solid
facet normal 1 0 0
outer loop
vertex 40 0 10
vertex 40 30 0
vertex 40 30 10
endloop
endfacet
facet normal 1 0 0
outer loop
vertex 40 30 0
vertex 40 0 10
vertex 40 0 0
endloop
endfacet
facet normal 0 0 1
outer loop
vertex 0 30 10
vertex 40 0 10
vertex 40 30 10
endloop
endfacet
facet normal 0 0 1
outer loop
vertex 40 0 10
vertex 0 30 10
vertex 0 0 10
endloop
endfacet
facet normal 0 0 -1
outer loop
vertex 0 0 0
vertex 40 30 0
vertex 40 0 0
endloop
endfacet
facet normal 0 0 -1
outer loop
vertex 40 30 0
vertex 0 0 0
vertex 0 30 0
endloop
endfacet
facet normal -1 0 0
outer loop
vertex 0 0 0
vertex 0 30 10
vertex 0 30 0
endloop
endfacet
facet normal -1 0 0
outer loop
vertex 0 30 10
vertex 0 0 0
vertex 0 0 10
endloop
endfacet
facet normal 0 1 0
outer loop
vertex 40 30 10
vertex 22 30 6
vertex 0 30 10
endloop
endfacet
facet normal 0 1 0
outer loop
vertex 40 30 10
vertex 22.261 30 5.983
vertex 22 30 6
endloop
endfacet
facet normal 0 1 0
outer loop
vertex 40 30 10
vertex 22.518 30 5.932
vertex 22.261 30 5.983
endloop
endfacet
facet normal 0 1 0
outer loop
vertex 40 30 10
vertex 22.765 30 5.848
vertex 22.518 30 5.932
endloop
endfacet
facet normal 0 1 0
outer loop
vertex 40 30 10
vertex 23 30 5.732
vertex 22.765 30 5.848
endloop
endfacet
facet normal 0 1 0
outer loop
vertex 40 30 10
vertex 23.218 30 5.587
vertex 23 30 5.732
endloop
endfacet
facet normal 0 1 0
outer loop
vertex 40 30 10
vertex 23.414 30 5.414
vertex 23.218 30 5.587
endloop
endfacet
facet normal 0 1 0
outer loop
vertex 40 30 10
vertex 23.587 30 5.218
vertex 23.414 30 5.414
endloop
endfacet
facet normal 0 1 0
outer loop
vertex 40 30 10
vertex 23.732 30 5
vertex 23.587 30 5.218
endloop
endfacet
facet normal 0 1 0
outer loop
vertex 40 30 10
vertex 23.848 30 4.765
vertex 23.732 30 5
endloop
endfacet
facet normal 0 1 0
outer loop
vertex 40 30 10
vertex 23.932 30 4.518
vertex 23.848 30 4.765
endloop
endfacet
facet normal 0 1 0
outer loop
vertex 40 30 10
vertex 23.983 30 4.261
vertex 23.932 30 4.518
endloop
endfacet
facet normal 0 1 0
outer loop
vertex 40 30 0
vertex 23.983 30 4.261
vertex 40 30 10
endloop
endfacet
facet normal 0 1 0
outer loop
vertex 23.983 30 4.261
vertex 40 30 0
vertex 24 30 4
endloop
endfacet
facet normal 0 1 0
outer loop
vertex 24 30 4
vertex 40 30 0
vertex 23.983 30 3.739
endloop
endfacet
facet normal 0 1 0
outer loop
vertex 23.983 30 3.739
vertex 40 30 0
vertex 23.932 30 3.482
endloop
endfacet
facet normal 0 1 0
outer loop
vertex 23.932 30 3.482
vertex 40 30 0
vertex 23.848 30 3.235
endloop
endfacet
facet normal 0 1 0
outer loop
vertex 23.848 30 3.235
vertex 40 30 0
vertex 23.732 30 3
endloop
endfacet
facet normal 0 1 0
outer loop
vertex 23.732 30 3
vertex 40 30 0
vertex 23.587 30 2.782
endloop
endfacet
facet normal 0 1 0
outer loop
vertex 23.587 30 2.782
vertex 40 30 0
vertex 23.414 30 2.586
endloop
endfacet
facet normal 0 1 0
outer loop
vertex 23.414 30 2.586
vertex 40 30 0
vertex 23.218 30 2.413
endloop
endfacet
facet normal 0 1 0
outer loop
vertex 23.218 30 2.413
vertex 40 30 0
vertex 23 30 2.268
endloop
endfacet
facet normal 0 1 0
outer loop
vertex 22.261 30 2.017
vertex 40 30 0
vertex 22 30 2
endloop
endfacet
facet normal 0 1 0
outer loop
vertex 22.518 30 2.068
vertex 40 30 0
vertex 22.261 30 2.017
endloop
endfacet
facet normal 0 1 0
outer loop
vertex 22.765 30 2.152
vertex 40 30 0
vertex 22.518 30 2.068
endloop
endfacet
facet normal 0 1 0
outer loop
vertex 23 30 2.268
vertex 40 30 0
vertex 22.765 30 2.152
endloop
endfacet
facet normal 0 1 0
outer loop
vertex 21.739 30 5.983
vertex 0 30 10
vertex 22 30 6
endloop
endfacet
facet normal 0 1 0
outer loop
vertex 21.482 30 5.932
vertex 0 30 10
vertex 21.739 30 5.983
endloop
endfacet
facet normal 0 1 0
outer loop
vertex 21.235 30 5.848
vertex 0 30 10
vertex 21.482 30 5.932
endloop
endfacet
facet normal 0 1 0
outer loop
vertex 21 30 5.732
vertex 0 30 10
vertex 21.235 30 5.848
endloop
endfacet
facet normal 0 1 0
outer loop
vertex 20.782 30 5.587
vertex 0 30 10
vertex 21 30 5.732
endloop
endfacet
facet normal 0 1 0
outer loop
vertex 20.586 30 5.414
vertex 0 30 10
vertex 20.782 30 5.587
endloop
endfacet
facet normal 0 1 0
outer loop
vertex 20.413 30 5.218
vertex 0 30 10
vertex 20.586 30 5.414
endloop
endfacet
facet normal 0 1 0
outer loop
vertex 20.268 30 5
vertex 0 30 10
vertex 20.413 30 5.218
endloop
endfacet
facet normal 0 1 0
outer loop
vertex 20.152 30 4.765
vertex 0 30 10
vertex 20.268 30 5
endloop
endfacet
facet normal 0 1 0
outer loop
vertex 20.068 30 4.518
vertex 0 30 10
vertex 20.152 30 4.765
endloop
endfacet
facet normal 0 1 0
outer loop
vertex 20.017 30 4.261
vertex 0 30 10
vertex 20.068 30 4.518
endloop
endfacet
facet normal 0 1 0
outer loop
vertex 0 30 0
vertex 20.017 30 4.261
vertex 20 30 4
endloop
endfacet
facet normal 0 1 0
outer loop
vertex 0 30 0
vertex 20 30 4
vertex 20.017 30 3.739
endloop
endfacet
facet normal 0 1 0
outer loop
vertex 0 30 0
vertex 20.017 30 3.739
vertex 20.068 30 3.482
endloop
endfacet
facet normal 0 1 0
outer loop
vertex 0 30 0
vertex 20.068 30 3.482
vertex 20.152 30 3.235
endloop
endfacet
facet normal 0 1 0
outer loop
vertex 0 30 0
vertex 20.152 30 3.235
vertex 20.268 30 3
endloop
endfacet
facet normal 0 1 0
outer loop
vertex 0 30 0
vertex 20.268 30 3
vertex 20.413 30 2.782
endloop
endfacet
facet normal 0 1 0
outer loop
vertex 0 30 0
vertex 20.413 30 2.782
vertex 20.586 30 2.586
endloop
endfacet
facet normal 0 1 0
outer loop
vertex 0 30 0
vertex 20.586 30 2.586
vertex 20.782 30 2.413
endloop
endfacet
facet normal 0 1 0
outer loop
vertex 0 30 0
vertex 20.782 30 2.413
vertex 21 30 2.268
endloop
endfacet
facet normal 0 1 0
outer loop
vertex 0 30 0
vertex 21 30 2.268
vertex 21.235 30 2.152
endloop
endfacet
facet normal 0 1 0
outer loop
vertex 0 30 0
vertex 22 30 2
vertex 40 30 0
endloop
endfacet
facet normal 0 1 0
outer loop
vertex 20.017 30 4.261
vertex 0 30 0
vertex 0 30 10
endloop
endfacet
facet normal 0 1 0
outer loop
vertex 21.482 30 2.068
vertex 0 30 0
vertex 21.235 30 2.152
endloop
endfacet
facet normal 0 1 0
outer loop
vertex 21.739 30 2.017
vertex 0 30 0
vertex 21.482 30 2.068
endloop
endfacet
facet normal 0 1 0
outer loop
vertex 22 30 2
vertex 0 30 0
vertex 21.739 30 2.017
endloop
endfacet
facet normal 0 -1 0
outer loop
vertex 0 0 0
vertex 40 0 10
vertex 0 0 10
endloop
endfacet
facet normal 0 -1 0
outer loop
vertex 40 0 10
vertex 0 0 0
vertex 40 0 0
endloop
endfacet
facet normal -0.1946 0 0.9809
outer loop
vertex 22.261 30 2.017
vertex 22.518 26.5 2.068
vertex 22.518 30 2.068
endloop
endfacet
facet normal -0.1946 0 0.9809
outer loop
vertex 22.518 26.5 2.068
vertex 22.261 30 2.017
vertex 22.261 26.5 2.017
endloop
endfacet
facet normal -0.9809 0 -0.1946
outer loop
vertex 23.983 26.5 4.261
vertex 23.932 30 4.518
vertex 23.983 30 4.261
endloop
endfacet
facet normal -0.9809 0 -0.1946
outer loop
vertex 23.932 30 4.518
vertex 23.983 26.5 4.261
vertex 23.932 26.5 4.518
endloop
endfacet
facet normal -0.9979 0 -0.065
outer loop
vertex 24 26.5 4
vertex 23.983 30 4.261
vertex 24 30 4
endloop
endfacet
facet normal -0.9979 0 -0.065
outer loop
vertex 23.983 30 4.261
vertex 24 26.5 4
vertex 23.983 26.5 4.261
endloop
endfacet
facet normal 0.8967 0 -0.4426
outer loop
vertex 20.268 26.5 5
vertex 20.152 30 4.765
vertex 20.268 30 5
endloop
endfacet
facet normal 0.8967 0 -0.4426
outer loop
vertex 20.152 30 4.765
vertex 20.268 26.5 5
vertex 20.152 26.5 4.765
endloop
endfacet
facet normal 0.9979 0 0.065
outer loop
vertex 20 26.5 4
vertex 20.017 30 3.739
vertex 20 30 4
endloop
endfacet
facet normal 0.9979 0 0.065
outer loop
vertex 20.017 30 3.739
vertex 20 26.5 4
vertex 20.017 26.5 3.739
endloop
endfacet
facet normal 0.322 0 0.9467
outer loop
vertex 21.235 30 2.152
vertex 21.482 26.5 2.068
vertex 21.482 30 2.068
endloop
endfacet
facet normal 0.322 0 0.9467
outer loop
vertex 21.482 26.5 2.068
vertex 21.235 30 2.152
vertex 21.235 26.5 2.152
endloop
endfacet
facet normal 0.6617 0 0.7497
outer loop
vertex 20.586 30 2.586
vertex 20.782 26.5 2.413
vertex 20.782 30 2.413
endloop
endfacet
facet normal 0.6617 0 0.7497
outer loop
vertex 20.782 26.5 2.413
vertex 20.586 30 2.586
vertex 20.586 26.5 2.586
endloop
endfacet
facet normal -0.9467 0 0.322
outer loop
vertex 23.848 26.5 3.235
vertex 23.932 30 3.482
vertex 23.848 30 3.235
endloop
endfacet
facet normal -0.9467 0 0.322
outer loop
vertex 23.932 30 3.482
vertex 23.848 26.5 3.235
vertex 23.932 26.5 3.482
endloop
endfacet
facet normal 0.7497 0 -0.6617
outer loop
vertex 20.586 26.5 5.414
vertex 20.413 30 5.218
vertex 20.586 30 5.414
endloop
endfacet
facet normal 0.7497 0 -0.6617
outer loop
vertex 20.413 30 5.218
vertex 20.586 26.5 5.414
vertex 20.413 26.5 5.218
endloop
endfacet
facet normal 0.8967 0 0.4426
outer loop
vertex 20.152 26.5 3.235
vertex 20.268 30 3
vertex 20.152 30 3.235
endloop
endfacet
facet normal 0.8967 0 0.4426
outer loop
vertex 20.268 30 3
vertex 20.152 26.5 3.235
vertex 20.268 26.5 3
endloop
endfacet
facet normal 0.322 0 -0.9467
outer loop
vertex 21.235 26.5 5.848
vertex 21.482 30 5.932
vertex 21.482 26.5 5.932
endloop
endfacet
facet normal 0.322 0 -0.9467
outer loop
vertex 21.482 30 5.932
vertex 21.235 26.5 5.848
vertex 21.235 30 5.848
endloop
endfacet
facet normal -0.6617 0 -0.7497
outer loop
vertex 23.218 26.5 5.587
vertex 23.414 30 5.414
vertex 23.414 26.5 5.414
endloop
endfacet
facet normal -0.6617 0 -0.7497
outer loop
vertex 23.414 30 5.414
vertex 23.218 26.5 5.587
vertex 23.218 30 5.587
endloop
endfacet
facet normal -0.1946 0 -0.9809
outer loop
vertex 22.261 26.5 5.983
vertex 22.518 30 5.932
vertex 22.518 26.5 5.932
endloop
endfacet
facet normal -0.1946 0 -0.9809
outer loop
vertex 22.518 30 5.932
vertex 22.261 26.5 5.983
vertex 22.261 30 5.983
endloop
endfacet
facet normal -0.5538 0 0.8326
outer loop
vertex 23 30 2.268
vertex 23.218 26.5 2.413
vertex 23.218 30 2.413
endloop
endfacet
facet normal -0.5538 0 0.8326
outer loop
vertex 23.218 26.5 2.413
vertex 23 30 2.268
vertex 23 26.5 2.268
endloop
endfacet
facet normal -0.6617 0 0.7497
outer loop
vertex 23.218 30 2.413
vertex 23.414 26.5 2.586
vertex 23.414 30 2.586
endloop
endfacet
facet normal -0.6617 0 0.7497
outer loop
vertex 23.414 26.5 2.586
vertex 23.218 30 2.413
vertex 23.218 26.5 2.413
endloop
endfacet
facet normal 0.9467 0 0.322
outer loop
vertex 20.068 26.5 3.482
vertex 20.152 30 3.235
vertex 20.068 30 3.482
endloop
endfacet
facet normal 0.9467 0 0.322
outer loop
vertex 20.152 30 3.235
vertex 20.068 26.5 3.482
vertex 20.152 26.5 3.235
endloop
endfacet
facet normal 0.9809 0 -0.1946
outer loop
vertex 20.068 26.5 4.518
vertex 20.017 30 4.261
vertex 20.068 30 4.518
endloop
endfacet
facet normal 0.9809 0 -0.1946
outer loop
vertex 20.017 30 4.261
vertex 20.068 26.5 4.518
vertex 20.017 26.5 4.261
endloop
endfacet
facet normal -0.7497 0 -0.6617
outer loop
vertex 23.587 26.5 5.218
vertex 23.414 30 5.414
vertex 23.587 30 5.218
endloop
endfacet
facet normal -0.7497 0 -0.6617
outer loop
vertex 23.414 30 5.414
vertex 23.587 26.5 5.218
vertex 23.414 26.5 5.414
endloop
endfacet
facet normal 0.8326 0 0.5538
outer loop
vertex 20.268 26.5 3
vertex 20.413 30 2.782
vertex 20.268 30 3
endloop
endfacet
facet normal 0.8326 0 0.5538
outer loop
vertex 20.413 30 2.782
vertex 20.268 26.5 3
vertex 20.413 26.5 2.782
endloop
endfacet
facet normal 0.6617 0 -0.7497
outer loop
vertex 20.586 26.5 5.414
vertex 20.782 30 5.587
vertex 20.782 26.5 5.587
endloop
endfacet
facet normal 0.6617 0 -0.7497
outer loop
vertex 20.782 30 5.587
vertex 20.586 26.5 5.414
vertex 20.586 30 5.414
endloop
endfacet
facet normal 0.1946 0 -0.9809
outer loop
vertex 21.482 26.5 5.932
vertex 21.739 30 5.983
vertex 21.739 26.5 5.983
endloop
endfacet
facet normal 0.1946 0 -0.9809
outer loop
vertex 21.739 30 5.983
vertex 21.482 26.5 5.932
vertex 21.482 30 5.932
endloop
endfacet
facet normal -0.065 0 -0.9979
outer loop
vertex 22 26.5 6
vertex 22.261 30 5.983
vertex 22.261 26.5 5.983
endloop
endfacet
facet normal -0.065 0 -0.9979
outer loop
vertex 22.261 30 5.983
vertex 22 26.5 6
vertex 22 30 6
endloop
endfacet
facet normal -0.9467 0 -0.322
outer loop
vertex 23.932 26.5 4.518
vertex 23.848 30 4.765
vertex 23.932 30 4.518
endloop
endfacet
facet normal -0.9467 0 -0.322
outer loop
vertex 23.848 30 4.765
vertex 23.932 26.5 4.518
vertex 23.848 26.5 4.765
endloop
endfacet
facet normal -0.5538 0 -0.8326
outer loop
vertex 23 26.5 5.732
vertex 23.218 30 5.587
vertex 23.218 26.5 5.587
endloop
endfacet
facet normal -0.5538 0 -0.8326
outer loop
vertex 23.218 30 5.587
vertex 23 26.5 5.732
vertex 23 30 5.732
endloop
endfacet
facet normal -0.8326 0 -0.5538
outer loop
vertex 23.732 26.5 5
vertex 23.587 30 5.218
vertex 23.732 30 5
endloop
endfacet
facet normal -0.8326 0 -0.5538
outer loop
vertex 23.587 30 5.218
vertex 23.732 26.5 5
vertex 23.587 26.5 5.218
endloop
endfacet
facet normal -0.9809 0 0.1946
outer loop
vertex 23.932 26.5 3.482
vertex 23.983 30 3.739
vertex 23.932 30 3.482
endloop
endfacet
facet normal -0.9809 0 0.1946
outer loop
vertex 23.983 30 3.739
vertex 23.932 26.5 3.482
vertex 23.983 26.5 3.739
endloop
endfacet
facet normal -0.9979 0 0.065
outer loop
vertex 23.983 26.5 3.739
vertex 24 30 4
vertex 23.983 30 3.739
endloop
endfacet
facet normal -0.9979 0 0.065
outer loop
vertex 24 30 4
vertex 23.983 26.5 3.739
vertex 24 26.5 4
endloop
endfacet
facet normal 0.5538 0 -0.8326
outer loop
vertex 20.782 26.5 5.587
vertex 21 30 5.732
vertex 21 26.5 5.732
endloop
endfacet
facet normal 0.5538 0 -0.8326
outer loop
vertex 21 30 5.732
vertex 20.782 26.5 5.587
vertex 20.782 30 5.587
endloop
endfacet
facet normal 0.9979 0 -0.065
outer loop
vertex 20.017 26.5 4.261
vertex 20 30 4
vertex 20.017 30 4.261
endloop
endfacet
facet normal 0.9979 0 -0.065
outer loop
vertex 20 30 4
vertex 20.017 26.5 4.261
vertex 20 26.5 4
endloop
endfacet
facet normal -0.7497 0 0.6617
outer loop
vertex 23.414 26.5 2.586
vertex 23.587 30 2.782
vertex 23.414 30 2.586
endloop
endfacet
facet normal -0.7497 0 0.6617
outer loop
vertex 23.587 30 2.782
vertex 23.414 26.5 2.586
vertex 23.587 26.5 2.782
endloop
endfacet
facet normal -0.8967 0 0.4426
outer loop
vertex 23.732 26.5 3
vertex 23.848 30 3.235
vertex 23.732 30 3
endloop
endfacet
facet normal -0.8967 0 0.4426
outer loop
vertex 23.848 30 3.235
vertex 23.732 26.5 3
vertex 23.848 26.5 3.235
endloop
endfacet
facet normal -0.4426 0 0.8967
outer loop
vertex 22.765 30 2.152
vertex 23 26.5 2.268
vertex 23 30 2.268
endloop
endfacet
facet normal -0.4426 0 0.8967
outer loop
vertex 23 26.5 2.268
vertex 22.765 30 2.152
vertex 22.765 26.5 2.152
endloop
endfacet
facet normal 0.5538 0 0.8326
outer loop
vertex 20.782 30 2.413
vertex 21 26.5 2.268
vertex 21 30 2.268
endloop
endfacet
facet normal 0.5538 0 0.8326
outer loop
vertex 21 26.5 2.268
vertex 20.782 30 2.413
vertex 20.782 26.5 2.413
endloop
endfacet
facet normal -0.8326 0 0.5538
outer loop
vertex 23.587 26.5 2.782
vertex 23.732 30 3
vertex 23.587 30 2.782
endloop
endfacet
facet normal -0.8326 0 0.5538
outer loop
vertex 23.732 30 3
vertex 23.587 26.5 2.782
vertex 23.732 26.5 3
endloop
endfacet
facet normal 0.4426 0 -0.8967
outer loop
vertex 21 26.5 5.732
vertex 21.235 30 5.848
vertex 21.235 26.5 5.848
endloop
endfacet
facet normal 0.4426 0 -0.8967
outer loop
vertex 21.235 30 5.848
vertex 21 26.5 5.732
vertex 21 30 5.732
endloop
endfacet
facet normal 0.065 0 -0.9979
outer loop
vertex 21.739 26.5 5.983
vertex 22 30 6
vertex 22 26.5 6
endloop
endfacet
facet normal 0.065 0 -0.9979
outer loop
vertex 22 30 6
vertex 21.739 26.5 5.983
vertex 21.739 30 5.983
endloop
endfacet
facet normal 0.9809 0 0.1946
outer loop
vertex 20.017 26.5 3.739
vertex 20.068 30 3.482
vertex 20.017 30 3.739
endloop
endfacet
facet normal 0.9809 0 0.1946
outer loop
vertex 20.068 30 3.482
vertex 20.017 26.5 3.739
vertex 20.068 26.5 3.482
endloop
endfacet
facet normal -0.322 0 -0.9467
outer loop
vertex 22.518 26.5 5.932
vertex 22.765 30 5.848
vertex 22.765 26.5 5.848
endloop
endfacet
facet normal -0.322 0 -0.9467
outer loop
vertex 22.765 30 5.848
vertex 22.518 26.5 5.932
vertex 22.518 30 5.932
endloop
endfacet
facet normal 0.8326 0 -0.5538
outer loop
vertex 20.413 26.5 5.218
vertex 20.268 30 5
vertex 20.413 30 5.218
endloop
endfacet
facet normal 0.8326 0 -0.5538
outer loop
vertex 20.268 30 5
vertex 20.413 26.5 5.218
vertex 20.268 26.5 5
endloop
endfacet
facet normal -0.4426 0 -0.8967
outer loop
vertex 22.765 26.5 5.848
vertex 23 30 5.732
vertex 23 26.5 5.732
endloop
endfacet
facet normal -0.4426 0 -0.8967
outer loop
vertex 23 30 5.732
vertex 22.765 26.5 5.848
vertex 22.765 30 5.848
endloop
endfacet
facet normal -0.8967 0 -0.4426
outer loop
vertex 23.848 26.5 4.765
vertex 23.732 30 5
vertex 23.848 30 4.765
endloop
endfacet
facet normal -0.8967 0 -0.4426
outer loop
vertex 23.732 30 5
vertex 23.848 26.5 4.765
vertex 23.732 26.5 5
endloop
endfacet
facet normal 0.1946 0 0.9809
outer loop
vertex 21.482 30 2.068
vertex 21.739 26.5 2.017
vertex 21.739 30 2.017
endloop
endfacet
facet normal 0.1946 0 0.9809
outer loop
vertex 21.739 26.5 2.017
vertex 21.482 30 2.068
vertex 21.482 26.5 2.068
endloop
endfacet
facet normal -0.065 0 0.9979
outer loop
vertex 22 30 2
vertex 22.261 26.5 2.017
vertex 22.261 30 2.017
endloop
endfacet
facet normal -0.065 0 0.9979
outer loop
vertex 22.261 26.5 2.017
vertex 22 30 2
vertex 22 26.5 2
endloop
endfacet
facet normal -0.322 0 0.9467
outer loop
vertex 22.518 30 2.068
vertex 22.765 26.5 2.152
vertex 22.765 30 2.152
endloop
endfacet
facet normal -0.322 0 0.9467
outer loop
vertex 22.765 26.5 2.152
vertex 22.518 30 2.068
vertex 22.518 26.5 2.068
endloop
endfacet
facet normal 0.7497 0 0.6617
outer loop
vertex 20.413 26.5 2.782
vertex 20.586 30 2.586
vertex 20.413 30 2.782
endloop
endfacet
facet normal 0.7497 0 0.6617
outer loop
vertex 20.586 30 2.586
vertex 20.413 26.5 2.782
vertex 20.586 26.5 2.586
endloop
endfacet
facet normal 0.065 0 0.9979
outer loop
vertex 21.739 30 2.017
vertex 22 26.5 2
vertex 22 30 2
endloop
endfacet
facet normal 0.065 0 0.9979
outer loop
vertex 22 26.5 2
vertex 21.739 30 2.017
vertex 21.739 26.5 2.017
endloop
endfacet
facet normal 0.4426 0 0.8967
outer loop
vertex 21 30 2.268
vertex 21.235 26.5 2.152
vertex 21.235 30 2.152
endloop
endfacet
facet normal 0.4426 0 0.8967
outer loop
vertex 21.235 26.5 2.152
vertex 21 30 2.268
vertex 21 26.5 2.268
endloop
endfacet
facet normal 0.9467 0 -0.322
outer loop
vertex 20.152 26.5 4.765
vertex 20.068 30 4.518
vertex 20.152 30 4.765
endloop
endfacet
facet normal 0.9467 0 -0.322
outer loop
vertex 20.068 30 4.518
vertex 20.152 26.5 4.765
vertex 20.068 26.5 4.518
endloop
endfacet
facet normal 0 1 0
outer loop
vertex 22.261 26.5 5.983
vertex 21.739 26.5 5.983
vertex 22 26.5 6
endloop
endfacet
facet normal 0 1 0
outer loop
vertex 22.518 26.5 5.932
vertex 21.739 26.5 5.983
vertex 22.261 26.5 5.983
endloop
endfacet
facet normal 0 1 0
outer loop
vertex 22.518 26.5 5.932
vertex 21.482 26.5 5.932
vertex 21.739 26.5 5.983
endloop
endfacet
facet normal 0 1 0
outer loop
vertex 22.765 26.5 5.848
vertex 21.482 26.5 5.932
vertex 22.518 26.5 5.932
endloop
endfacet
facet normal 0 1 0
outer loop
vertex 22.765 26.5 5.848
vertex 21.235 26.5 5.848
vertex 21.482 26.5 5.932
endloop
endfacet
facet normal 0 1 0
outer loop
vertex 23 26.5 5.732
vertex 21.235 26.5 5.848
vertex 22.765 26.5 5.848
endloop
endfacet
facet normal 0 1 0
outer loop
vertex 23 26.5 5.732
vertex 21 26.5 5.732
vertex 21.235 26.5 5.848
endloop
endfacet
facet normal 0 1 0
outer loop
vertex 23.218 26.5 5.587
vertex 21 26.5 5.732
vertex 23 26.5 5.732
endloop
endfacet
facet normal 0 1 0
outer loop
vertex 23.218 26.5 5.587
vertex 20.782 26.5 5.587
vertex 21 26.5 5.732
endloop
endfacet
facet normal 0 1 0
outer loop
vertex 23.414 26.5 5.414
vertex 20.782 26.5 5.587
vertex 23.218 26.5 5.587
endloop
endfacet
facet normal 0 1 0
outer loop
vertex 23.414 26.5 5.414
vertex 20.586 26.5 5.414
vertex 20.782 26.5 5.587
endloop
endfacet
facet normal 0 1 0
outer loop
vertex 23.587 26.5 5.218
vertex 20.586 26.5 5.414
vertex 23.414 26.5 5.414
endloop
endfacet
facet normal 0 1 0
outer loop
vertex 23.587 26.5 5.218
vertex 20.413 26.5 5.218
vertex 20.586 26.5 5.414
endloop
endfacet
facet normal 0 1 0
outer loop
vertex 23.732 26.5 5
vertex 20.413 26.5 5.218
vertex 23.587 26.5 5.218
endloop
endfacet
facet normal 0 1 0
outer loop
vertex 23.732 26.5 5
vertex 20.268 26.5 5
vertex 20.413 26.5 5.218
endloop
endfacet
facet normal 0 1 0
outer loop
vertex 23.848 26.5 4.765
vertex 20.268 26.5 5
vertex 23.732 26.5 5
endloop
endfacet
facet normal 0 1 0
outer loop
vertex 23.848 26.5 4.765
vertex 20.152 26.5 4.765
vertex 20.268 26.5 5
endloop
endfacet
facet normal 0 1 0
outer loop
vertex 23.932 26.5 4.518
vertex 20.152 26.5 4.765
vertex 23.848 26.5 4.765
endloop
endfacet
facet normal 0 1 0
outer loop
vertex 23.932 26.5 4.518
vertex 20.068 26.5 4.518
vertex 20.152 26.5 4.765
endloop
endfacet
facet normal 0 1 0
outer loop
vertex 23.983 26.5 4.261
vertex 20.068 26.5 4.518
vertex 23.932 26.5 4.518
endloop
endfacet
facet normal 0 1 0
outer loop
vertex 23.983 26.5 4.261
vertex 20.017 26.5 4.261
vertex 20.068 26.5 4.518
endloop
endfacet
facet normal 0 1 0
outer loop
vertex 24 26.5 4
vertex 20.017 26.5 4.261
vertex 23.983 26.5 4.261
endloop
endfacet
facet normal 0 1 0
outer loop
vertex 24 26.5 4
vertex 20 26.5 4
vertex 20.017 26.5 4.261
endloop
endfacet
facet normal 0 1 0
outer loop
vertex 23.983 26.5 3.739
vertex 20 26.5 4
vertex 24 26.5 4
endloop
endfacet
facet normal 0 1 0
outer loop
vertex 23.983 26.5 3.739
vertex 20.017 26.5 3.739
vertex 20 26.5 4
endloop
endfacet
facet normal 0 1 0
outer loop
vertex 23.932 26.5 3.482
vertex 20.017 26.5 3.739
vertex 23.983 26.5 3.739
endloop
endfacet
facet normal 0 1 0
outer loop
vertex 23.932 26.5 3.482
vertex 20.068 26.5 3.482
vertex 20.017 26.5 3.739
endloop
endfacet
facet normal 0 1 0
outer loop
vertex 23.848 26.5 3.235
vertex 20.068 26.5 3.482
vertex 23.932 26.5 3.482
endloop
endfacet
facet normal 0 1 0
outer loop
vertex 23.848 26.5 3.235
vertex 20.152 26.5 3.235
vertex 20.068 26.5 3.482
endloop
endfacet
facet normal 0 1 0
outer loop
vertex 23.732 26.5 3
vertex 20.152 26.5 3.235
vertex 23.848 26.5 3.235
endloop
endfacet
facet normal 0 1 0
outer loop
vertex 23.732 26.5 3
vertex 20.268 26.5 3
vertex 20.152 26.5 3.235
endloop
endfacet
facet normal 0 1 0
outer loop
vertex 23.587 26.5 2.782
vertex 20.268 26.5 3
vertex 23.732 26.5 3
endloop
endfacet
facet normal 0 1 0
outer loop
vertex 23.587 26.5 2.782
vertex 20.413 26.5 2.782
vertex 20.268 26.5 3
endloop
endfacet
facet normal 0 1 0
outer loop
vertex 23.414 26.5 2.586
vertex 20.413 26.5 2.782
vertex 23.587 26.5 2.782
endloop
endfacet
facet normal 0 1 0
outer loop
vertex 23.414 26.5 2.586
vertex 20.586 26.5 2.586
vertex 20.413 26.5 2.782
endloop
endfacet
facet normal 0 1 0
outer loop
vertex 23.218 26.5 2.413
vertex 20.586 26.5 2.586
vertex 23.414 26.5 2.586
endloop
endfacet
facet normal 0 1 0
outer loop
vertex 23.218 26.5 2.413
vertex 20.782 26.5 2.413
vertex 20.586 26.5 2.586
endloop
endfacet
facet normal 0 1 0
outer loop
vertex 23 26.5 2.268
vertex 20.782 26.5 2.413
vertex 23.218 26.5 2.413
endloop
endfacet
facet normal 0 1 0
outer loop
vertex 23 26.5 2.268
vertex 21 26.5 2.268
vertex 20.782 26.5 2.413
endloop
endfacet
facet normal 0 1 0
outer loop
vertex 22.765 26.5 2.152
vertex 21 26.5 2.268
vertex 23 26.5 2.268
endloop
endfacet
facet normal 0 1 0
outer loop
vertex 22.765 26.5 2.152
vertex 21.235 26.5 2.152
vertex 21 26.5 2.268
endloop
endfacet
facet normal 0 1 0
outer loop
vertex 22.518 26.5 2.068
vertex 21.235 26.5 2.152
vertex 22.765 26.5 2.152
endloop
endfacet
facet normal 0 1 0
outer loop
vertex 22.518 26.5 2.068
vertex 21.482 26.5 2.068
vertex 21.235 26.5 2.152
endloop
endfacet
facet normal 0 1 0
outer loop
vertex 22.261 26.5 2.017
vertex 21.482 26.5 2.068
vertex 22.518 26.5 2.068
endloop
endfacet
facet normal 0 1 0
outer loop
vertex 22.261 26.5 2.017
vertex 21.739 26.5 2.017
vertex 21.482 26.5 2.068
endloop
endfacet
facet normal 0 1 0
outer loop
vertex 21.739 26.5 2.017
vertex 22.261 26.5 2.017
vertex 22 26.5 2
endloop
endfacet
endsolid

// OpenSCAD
// units=mm — generated by scad_emitter.py
// part=unnamed
$fn = 48;

difference() { cube([40, 30, 10]); translate([22, 30.5, 4]) rotate([90, 0, 0]) cylinder(h=4, r=2, $fn=$fn); }
